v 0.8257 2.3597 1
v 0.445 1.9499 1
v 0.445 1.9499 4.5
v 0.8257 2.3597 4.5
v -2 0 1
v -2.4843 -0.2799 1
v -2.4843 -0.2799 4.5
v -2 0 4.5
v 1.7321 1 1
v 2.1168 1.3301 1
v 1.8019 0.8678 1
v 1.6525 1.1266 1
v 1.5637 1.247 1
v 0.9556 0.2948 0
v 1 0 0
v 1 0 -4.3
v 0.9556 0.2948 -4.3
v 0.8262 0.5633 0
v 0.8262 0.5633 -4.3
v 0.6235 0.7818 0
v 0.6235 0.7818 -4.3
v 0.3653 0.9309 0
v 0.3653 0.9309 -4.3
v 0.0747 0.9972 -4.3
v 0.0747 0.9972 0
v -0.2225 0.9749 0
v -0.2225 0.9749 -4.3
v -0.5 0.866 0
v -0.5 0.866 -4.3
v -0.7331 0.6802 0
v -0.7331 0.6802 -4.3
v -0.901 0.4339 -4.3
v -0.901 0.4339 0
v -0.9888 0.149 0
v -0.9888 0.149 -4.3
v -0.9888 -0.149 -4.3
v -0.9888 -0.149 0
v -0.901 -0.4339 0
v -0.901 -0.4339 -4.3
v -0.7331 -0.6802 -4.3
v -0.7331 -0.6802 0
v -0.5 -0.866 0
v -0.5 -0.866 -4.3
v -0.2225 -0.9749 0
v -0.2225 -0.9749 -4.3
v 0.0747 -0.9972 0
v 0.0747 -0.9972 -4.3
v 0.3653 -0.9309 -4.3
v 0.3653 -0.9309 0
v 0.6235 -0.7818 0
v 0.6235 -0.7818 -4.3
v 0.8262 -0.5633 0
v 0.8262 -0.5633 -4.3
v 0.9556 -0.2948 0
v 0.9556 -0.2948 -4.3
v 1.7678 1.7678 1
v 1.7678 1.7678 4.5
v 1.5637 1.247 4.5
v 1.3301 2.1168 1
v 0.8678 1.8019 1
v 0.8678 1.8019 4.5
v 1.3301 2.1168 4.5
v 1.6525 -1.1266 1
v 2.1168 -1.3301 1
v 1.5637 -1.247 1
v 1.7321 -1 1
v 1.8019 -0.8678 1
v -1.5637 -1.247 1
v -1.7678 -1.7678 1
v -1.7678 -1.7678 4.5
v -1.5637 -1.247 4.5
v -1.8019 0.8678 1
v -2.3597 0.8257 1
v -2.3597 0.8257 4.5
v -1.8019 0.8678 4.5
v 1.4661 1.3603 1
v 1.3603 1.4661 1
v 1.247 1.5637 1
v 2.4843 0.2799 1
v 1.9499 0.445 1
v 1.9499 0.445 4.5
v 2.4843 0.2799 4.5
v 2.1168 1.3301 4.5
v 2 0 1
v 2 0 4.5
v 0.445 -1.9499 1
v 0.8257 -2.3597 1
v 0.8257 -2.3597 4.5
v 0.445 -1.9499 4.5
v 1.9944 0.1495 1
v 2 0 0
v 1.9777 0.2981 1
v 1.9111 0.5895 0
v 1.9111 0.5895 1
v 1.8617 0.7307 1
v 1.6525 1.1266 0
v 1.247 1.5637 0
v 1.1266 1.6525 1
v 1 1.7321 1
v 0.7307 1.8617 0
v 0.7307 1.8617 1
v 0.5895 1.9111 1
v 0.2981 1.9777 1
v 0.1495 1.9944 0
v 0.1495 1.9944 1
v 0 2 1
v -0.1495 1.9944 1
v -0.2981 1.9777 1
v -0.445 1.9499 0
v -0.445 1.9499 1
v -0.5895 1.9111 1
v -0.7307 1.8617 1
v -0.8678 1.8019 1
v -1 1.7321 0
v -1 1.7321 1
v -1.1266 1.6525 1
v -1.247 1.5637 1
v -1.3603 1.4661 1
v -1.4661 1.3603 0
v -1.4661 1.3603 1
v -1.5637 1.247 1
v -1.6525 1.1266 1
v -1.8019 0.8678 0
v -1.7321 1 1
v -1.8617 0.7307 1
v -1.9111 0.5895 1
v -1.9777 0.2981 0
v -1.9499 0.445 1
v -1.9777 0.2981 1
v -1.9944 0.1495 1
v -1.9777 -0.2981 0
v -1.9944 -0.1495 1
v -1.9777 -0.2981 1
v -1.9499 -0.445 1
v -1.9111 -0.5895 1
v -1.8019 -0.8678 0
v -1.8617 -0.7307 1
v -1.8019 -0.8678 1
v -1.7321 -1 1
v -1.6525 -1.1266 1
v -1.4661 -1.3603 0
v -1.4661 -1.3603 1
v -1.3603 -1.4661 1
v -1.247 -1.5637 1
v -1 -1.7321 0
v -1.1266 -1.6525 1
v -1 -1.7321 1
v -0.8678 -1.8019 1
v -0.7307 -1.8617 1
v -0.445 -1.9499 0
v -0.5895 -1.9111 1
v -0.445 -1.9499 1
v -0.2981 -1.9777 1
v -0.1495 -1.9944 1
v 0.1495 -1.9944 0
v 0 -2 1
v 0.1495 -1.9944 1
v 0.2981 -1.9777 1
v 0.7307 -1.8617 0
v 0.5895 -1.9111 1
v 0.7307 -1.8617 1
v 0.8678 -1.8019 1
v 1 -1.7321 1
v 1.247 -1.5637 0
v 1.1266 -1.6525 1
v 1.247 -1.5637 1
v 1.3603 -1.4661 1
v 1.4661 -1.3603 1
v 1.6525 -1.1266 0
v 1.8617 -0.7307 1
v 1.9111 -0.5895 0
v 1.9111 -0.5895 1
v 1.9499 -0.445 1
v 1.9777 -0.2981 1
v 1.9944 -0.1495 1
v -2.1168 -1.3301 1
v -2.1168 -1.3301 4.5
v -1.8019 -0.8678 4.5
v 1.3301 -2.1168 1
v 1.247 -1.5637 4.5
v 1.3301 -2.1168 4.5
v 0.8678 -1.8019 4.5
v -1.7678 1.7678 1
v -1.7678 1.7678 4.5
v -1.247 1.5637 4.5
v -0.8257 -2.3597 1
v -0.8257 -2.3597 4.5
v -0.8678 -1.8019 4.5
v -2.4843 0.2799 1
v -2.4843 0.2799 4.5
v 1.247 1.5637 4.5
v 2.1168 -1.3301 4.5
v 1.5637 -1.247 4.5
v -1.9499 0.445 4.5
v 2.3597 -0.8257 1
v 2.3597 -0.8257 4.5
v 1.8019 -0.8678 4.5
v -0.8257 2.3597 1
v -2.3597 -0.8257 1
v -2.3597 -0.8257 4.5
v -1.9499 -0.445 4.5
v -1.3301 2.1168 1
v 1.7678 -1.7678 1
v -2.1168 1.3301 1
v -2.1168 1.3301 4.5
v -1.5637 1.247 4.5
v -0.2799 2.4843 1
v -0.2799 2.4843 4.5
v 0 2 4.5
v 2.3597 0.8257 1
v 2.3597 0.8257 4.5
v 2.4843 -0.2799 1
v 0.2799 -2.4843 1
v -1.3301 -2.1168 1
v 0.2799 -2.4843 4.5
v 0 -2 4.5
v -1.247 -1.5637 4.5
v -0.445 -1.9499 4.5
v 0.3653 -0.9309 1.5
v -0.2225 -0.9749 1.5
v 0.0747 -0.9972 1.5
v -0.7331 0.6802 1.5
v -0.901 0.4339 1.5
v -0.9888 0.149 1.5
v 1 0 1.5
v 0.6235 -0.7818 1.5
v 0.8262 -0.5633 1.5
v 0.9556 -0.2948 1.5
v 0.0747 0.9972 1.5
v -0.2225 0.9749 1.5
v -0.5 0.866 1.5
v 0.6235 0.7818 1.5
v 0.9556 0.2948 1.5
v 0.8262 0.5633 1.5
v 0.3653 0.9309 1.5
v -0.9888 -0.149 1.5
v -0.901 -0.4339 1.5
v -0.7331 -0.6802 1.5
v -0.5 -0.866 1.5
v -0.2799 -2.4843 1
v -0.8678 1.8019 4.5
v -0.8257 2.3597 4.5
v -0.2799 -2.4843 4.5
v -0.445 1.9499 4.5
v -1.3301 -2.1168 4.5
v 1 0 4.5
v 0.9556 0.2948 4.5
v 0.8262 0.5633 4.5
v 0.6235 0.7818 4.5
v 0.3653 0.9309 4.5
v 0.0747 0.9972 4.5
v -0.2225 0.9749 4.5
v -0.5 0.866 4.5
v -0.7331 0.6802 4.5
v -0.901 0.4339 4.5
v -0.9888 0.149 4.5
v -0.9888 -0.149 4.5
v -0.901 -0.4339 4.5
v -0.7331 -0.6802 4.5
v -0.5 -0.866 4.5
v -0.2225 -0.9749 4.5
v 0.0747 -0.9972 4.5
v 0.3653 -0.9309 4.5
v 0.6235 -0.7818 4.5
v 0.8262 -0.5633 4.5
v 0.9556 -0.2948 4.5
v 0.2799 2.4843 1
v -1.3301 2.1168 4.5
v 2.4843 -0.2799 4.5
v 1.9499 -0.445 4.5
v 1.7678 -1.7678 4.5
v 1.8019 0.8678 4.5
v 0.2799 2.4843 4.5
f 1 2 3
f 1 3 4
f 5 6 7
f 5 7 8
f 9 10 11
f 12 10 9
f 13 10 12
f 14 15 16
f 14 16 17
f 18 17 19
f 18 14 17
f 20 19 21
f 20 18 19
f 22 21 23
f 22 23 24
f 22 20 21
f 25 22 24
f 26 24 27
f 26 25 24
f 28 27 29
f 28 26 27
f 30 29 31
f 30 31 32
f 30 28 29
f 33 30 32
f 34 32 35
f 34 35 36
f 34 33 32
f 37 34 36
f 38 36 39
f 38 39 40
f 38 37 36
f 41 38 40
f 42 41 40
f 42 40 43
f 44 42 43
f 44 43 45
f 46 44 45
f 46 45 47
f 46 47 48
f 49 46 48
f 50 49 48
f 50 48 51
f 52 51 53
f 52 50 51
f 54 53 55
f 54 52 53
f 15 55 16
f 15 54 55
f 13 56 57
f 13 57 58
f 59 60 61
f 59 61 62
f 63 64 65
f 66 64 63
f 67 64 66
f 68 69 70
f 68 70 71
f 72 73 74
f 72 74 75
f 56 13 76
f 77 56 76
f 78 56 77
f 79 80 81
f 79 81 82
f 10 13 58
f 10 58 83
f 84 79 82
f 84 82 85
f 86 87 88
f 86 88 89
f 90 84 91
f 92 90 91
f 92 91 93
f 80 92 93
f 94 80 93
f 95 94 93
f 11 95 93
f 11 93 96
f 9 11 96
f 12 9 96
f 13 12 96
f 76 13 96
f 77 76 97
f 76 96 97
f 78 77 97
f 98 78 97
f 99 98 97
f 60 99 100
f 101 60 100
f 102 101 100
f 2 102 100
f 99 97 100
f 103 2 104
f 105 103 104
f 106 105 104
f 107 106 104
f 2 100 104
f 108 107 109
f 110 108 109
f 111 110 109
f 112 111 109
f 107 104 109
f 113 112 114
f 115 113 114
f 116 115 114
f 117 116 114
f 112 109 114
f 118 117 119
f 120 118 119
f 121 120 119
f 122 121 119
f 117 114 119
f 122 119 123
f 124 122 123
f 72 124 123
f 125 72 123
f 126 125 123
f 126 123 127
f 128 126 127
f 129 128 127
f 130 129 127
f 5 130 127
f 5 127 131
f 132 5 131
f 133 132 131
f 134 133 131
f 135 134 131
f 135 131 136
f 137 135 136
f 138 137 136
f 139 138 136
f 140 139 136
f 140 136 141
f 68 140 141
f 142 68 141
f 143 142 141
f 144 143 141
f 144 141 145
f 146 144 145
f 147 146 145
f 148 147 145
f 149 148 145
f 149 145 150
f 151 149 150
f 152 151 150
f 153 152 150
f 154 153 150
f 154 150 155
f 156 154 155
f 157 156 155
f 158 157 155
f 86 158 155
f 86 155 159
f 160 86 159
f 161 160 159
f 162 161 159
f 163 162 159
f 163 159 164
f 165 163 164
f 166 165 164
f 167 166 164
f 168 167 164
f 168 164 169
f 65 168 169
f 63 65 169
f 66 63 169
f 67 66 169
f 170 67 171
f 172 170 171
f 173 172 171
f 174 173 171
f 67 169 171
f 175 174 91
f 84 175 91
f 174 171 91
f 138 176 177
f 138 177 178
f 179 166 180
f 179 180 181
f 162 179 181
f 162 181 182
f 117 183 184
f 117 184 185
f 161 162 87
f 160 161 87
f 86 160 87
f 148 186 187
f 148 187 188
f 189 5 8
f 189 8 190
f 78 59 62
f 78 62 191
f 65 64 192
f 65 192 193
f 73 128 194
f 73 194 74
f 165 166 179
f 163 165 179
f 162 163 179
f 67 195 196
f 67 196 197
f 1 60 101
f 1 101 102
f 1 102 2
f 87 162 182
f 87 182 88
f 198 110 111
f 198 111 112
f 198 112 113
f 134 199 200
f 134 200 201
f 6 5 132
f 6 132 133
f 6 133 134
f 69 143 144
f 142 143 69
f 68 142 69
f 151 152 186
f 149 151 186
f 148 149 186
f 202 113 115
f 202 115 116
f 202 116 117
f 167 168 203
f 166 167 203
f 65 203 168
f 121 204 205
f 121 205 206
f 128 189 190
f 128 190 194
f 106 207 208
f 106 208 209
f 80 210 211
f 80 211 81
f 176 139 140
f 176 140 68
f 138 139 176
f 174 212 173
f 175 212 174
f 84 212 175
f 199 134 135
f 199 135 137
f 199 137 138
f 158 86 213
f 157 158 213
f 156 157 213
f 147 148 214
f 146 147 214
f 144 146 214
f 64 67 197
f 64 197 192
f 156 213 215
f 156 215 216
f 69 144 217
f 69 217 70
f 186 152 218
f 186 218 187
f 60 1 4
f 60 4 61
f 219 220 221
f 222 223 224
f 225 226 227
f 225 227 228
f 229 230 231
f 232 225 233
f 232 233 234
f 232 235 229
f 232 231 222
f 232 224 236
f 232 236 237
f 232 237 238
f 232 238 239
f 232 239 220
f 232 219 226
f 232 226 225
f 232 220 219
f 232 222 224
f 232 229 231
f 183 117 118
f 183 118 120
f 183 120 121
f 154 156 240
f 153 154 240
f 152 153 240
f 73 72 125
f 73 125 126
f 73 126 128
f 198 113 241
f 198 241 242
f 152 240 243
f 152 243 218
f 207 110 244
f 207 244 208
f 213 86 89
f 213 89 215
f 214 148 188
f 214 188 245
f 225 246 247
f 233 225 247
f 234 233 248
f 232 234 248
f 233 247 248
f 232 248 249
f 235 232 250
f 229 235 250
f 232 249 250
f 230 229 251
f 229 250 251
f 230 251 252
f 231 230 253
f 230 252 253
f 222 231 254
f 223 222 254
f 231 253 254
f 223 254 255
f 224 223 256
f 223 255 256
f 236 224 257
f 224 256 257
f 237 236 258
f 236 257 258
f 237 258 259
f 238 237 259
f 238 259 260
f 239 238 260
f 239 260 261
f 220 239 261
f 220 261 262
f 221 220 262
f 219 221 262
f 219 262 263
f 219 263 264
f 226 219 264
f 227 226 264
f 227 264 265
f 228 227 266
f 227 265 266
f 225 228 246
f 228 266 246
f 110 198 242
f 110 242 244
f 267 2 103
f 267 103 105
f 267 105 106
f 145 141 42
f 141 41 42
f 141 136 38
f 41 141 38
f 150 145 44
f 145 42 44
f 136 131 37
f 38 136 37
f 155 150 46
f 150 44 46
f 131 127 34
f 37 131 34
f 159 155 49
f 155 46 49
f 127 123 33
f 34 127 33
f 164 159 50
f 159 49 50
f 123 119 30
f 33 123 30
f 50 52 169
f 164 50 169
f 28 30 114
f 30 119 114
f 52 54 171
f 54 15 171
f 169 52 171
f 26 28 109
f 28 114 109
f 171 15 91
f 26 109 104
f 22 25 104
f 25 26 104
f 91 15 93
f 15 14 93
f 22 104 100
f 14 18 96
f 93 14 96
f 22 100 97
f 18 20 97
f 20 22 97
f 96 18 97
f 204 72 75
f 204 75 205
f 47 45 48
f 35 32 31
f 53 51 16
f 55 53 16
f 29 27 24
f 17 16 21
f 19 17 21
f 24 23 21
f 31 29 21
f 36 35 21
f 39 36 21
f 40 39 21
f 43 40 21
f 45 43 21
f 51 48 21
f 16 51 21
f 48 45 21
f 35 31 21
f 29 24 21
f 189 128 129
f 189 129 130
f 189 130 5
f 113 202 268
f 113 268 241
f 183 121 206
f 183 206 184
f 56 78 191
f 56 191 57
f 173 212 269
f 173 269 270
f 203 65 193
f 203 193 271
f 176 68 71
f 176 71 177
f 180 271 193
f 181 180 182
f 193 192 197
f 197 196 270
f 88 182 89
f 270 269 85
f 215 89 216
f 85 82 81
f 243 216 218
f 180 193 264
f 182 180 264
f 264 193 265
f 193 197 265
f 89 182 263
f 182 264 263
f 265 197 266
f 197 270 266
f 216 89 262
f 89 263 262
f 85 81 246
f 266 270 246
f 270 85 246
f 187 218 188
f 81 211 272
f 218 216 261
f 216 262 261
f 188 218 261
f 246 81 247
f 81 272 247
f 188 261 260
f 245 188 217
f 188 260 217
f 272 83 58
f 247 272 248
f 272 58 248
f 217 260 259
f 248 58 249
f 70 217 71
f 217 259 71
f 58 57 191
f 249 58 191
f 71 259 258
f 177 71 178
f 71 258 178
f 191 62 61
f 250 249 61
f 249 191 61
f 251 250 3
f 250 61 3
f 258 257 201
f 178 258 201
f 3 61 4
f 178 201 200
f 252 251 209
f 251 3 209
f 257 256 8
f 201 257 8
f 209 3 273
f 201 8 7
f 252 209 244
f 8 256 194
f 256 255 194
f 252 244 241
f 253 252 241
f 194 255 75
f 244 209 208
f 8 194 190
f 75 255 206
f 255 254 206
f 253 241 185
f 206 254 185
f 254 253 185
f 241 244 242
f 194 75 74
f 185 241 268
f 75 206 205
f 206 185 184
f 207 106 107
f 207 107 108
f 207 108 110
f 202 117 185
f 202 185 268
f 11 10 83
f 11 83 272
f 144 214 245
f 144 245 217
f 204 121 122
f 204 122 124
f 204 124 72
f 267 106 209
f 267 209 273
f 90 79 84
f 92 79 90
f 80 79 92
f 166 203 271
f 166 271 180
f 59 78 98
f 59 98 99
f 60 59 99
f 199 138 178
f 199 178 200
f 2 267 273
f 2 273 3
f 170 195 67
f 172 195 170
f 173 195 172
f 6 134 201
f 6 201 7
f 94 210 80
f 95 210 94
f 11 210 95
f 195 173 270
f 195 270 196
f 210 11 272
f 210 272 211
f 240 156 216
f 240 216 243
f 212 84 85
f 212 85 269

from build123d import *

# Parameters (mm, degrees)
SKETCH_1_R          = 1
EXTRUDE_1_DEPTH     = 4.3
SKETCH_2_R          = 2
EXTRUDE_2_DEPTH     = 1
EXTRUDE_3_DEPTH     = 3.5
SKETCH_4_R          = 1
CUT_EXTRUDE_1_DEPTH = 3


with BuildPart() as part:
    # 草图1 → 凸台-拉伸1 (new body)
    with BuildSketch(Plane.XY):
        Circle(SKETCH_1_R)
    extrude(amount=-EXTRUDE_1_DEPTH)

    # 草图2 → 凸台-拉伸2 (add)
    with BuildSketch(Plane.XY):
        Circle(SKETCH_2_R)
    extrude(amount=EXTRUDE_2_DEPTH)

    # 草图3 → 凸台-拉伸3 (add)
    with BuildSketch(Plane.XY.offset(1)):
        Polygon((2.359708326, -0.825697655), (1.801937736, -0.867767478), (2.116810498, -1.330080191), (1.563662965, -1.246979604), (1.767766953, -1.767766953), (1.246979604, -1.563662965), (1.330080191, -2.116810498), (0.867767478, -1.801937736), (0.825697655, -2.359708326), (0.445041868, -1.949855824), (0.27991119, -2.484280525), (0, -2), (-0.27991119, -2.484280525), (-0.445041868, -1.949855824), (-0.825697655, -2.359708326), (-0.867767478, -1.801937736), (-1.330080191, -2.116810498), (-1.246979604, -1.563662965), (-1.767766953, -1.767766953), (-1.563662965, -1.246979604), (-2.116810498, -1.330080191), (-1.801937736, -0.867767478), (-2.359708326, -0.825697655), (-1.949855824, -0.445041868), (-2.484280525, -0.27991119), (-2, 0), (-2.484280525, 0.27991119), (-1.949855824, 0.445041868), (-2.359708326, 0.825697655), (-1.801937736, 0.867767478), (-2.116810498, 1.330080191), (-1.563662965, 1.246979604), (-1.767766953, 1.767766953), (-1.246979604, 1.563662965), (-1.330080191, 2.116810498), (-0.867767478, 1.801937736), (-0.825697655, 2.359708326), (-0.445041868, 1.949855824), (-0.27991119, 2.484280525), (0, 2), (0.27991119, 2.484280525), (0.445041868, 1.949855824), (0.825697655, 2.359708326), (0.867767478, 1.801937736), (1.330080191, 2.116810498), (1.246979604, 1.563662965), (1.767766953, 1.767766953), (1.563662965, 1.246979604), (2.116810498, 1.330080191), (1.801937736, 0.867767478), (2.359708326, 0.825697655), (1.949855824, 0.445041868), (2.484280525, 0.27991119), (2, 0), (2.484280525, -0.27991119), (1.949855824, -0.445041868), align=None)
    extrude(amount=EXTRUDE_3_DEPTH)

    # 草图4 → 切除-拉伸1 (cut)
    with BuildSketch(Plane.XY.offset(4.5)):
        Circle(SKETCH_4_R)
    extrude(amount=-CUT_EXTRUDE_1_DEPTH, mode=Mode.SUBTRACT)


solid = part.part
